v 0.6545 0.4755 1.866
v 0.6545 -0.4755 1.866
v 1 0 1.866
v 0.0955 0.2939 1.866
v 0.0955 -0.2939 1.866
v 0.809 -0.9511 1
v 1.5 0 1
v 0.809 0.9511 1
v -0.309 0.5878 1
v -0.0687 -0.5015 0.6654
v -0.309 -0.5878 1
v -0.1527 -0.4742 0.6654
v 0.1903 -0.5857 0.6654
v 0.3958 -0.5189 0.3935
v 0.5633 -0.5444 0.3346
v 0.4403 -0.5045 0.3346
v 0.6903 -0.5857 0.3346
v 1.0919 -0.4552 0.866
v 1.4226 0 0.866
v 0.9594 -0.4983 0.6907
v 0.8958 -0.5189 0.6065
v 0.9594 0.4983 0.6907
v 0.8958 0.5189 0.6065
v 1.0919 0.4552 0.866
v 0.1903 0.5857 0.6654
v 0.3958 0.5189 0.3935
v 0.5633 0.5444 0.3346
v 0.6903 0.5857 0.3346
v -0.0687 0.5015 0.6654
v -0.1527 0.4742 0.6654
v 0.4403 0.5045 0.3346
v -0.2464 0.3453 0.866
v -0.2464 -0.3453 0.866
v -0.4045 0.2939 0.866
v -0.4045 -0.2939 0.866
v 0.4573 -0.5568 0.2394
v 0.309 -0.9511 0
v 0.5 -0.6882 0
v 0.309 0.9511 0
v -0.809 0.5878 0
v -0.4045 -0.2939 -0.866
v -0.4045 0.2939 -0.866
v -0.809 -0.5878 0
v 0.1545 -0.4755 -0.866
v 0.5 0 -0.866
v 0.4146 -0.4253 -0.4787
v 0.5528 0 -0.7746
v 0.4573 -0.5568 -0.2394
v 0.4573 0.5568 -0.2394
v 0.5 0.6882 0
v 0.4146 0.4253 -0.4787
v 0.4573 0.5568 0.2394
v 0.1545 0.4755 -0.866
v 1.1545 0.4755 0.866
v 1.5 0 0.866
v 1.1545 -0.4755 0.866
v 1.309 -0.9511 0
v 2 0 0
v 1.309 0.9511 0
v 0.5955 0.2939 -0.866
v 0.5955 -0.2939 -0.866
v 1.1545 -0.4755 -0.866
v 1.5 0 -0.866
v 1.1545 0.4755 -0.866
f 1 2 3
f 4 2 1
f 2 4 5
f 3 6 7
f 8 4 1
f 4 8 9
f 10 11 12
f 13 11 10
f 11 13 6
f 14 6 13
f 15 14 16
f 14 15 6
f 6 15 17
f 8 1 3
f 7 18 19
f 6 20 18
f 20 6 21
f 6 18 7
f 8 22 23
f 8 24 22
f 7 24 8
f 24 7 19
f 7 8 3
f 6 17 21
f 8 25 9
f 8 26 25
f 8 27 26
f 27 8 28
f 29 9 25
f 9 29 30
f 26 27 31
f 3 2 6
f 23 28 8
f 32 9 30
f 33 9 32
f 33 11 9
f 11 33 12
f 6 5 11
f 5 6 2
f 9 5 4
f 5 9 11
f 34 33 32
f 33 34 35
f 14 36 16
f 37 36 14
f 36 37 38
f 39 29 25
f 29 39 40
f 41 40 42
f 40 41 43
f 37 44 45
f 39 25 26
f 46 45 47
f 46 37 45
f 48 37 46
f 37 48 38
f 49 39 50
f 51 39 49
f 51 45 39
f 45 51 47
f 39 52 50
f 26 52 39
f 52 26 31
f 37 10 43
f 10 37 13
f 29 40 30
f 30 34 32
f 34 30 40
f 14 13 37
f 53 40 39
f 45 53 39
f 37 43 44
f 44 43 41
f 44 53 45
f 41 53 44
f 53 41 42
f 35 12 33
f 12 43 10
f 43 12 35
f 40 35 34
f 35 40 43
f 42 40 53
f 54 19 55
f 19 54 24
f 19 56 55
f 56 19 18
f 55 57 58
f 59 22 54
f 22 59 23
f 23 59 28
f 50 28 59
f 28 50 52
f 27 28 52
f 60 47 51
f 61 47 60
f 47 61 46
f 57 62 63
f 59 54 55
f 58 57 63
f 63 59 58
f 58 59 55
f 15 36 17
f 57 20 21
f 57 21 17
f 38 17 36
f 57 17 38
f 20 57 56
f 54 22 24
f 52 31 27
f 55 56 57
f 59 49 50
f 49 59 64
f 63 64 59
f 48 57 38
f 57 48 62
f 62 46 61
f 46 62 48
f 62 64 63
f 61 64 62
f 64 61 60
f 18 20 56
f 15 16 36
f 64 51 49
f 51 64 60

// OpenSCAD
union(){
    color("cyan")
    translate([1,0,0])
        sphere();
    union(){
      color([0,1,0])
      translate([0.5,0,1])  
        sphere();
      color("pink")
        sphere();
    }
}
